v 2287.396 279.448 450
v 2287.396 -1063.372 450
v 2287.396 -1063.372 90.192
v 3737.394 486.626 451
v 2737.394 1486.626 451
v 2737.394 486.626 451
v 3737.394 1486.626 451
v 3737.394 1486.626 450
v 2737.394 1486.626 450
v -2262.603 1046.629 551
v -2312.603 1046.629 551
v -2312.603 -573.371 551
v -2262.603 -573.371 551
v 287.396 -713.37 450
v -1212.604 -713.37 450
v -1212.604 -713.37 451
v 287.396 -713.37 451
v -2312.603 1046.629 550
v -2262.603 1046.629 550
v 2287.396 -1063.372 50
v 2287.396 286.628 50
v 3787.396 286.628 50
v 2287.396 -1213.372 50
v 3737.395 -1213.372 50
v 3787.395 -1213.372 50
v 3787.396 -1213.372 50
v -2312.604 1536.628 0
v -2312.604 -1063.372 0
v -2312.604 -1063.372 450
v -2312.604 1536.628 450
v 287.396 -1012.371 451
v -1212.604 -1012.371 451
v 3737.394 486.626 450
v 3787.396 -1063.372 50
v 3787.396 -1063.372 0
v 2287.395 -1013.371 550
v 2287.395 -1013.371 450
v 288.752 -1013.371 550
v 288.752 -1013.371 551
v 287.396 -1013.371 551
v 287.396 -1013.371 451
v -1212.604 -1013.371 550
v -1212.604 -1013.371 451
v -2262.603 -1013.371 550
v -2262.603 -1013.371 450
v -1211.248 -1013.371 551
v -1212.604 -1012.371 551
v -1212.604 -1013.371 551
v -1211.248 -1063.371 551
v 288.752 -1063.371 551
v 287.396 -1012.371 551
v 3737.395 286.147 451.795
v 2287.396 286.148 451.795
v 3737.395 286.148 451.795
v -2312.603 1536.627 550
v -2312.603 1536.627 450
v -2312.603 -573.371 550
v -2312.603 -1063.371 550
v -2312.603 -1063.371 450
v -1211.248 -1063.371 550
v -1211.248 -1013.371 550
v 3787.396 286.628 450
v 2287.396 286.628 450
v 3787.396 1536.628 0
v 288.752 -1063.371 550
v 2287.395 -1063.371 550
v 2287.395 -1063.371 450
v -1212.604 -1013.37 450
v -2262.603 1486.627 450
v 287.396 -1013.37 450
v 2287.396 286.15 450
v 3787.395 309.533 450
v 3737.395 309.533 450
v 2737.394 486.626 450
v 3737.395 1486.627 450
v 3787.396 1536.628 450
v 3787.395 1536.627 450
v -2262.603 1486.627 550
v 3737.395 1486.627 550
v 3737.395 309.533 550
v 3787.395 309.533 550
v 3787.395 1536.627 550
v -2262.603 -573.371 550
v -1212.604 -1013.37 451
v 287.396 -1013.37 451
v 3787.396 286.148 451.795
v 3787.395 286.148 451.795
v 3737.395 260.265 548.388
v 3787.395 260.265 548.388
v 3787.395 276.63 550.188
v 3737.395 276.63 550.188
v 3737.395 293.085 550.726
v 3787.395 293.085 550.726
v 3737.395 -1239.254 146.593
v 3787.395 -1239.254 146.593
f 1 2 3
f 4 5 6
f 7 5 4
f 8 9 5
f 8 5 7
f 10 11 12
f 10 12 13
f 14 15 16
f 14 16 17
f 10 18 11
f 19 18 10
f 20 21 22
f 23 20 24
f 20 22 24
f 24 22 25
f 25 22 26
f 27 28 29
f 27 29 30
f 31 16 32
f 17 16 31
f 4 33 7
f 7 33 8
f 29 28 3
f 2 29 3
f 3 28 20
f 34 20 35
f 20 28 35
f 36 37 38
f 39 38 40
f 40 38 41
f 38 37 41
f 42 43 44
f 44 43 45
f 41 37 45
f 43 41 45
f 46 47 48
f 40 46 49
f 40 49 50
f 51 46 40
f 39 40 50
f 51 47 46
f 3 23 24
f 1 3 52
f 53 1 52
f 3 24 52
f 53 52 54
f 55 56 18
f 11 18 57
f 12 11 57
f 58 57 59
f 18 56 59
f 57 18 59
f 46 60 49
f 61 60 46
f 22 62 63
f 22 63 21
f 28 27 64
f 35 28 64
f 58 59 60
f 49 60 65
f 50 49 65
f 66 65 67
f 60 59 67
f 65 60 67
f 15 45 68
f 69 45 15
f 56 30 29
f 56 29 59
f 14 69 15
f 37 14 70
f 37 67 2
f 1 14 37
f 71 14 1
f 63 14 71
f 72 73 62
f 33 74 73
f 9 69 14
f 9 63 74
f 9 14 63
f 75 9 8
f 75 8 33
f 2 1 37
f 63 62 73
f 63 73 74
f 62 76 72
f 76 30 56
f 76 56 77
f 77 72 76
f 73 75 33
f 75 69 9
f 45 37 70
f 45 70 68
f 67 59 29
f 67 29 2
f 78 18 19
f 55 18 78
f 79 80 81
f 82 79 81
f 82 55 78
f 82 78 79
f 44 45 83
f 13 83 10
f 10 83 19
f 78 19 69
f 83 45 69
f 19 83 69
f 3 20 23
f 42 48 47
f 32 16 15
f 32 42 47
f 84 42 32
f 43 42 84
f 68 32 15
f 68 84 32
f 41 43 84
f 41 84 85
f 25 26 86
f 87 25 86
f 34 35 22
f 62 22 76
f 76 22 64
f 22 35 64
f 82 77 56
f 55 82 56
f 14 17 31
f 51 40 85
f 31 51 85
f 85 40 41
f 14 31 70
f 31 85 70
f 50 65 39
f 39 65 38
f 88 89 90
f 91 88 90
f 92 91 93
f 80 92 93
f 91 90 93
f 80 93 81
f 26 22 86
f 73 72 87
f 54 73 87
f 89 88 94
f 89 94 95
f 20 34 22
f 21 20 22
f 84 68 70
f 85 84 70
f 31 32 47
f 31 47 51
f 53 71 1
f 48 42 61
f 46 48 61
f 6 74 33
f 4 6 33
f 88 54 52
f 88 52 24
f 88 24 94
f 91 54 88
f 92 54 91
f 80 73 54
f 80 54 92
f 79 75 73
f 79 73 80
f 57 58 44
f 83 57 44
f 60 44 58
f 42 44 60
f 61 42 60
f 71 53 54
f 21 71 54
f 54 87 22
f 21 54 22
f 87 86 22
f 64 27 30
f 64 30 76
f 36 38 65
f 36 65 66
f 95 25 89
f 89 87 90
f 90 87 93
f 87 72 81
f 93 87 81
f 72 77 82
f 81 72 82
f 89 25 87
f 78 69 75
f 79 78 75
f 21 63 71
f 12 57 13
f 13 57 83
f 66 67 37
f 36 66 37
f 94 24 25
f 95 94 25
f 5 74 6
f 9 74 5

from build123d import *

# Parameters (mm, degrees)
SKETCH1_W            = 6100
SKETCH1_H            = 2600
BOSS_EXTRUDE1_DEPTH  = 450
SKETCH4_W            = 400
SKETCH4_H            = 1350
CUT_EXTRUDE1_DEPTH   = 1500
BOSS_EXTRUDE3_DEPTH  = 1500
SKETCH6_W            = 50
SKETCH6_H            = 1552.417027542
BOSS_EXTRUDE4_DEPTH  = 100
BOSS_EXTRUDE5_DEPTH  = 100
SKETCH8_W            = 1000
SKETCH8_H            = 1000
BOSS_EXTRUDE6_DEPTH  = 1
SKETCH9_W            = 1500
SKETCH9_H            = 300
BOSS_EXTRUDE7_DEPTH  = 1
SKETCH11_W           = 50
SKETCH11_H           = 1620
BOSS_EXTRUDE8_DEPTH  = 1
BOSS_EXTRUDE9_DEPTH  = 50
SKETCH13_W           = 1500
SKETCH13_H           = 100
BOSS_EXTRUDE10_DEPTH = 1
SKETCH14_W           = 1500
SKETCH14_H           = 50
BOSS_EXTRUDE11_DEPTH = 1


with BuildPart() as part:
    # Sketch1 → Boss-Extrude1 (new body)
    with BuildSketch(Plane.XY):
        with Locations((737.396460488, 236.627579872)):
            Rectangle(SKETCH1_W, SKETCH1_H)
    extrude(amount=BOSS_EXTRUDE1_DEPTH)

    # Sketch4 → Cut-Extrude1 (cut)
    with BuildSketch(Plane(origin=(3787.396460488, 0, 0), x_dir=(0, 0, -1), z_dir=(1, 0, 0))):
        with Locations((-250, -388.372420128)):
            Rectangle(SKETCH4_W, SKETCH4_H)
    extrude(amount=-CUT_EXTRUDE1_DEPTH, mode=Mode.SUBTRACT)

    # Sketch5 → Boss-Extrude3 (add)
    with BuildSketch(Plane(origin=(3787.396460488, 0, 0), x_dir=(0, 0, -1), z_dir=(1, 0, 0))):
        Polygon((-451.795187023, 286.147509687), (-50.000025773, 286.627553668), (-50.000025773, -1213.372446332), align=None)
    extrude(amount=-BOSS_EXTRUDE3_DEPTH)

    # Sketch6 → Boss-Extrude4 (add)
    with BuildSketch(Plane(origin=(0, -93.780548221, 349.993770724), x_dir=(1, 0, 0), z_dir=(0, -0.2588190451025147, 0.96592582628907))):
        with Locations((3762.395460488, -382.87836543)):
            Rectangle(SKETCH6_W, SKETCH6_H)
    extrude(amount=BOSS_EXTRUDE4_DEPTH)

    # Sketch7 → Boss-Extrude5 (add)
    with BuildSketch(Plane.XY.offset(450)):
        Polygon((3787.395460488, 309.532556673), (3787.395460488, 1536.626579872), (-2312.602539512, 1536.626579872), (-2312.602539512, -1063.371420128), (2287.395460488, -1063.371420128), (2287.395460488, -1013.371420128), (-2262.602539512, -1013.371420128), (-2262.602539512, 1486.626579872), (3737.395460488, 1486.626579872), (3737.395460488, 309.532556673), align=None)
    extrude(amount=BOSS_EXTRUDE5_DEPTH)

    # Sketch8 → Boss-Extrude6 (add)
    with BuildSketch(Plane.XY.offset(450)):
        with Locations((3237.394460488, 986.625579872)):
            Rectangle(SKETCH8_W, SKETCH8_H)
    extrude(amount=BOSS_EXTRUDE6_DEPTH)

    # Sketch9 → Boss-Extrude7 (add)
    with BuildSketch(Plane.XY.offset(450)):
        with Locations((-462.603539512, -863.370420128)):
            Rectangle(SKETCH9_W, SKETCH9_H)
    extrude(amount=BOSS_EXTRUDE7_DEPTH)

    # Sketch11 → Boss-Extrude8 (add)
    with BuildSketch(Plane.XY.offset(550)):
        with Locations((-2287.602539512, 236.628579872)):
            Rectangle(SKETCH11_W, SKETCH11_H)
    extrude(amount=BOSS_EXTRUDE8_DEPTH)

    # Sketch12 → Boss-Extrude9 (add)
    with BuildSketch(Plane(origin=(3787.395460488, 0, 0), x_dir=(0, 0, -1), z_dir=(1, 0, 0))):
        with BuildLine():
            Line((-550, 309.532556673), (-450, 309.532556673))
            Line((-450, 309.532556673), (-451.795104128, 286.14720032))
            Line((-451.795104128, 286.14720032), (-548.387686757, 260.265295809))
            ThreePointArc((-548.387686757, 260.265295809), (-550.614930996, 284.852419934), (-550, 309.532556673))
        make_face()
    extrude(amount=-BOSS_EXTRUDE9_DEPTH)

    # Sketch13 → Boss-Extrude10 (add)
    with BuildSketch(Plane(origin=(0, -1013.371420128, 0), x_dir=(1, 0, 0), z_dir=(0, 1, 0))):
        with Locations((-462.603539512, -501)):
            Rectangle(SKETCH13_W, SKETCH13_H)
    extrude(amount=BOSS_EXTRUDE10_DEPTH)

    # Sketch14 → Boss-Extrude11 (add)
    with BuildSketch(Plane.XY.offset(550)):
        with Locations((-461.248387127, -1038.371420128)):
            Rectangle(SKETCH14_W, SKETCH14_H)
    extrude(amount=BOSS_EXTRUDE11_DEPTH)


solid = part.part
